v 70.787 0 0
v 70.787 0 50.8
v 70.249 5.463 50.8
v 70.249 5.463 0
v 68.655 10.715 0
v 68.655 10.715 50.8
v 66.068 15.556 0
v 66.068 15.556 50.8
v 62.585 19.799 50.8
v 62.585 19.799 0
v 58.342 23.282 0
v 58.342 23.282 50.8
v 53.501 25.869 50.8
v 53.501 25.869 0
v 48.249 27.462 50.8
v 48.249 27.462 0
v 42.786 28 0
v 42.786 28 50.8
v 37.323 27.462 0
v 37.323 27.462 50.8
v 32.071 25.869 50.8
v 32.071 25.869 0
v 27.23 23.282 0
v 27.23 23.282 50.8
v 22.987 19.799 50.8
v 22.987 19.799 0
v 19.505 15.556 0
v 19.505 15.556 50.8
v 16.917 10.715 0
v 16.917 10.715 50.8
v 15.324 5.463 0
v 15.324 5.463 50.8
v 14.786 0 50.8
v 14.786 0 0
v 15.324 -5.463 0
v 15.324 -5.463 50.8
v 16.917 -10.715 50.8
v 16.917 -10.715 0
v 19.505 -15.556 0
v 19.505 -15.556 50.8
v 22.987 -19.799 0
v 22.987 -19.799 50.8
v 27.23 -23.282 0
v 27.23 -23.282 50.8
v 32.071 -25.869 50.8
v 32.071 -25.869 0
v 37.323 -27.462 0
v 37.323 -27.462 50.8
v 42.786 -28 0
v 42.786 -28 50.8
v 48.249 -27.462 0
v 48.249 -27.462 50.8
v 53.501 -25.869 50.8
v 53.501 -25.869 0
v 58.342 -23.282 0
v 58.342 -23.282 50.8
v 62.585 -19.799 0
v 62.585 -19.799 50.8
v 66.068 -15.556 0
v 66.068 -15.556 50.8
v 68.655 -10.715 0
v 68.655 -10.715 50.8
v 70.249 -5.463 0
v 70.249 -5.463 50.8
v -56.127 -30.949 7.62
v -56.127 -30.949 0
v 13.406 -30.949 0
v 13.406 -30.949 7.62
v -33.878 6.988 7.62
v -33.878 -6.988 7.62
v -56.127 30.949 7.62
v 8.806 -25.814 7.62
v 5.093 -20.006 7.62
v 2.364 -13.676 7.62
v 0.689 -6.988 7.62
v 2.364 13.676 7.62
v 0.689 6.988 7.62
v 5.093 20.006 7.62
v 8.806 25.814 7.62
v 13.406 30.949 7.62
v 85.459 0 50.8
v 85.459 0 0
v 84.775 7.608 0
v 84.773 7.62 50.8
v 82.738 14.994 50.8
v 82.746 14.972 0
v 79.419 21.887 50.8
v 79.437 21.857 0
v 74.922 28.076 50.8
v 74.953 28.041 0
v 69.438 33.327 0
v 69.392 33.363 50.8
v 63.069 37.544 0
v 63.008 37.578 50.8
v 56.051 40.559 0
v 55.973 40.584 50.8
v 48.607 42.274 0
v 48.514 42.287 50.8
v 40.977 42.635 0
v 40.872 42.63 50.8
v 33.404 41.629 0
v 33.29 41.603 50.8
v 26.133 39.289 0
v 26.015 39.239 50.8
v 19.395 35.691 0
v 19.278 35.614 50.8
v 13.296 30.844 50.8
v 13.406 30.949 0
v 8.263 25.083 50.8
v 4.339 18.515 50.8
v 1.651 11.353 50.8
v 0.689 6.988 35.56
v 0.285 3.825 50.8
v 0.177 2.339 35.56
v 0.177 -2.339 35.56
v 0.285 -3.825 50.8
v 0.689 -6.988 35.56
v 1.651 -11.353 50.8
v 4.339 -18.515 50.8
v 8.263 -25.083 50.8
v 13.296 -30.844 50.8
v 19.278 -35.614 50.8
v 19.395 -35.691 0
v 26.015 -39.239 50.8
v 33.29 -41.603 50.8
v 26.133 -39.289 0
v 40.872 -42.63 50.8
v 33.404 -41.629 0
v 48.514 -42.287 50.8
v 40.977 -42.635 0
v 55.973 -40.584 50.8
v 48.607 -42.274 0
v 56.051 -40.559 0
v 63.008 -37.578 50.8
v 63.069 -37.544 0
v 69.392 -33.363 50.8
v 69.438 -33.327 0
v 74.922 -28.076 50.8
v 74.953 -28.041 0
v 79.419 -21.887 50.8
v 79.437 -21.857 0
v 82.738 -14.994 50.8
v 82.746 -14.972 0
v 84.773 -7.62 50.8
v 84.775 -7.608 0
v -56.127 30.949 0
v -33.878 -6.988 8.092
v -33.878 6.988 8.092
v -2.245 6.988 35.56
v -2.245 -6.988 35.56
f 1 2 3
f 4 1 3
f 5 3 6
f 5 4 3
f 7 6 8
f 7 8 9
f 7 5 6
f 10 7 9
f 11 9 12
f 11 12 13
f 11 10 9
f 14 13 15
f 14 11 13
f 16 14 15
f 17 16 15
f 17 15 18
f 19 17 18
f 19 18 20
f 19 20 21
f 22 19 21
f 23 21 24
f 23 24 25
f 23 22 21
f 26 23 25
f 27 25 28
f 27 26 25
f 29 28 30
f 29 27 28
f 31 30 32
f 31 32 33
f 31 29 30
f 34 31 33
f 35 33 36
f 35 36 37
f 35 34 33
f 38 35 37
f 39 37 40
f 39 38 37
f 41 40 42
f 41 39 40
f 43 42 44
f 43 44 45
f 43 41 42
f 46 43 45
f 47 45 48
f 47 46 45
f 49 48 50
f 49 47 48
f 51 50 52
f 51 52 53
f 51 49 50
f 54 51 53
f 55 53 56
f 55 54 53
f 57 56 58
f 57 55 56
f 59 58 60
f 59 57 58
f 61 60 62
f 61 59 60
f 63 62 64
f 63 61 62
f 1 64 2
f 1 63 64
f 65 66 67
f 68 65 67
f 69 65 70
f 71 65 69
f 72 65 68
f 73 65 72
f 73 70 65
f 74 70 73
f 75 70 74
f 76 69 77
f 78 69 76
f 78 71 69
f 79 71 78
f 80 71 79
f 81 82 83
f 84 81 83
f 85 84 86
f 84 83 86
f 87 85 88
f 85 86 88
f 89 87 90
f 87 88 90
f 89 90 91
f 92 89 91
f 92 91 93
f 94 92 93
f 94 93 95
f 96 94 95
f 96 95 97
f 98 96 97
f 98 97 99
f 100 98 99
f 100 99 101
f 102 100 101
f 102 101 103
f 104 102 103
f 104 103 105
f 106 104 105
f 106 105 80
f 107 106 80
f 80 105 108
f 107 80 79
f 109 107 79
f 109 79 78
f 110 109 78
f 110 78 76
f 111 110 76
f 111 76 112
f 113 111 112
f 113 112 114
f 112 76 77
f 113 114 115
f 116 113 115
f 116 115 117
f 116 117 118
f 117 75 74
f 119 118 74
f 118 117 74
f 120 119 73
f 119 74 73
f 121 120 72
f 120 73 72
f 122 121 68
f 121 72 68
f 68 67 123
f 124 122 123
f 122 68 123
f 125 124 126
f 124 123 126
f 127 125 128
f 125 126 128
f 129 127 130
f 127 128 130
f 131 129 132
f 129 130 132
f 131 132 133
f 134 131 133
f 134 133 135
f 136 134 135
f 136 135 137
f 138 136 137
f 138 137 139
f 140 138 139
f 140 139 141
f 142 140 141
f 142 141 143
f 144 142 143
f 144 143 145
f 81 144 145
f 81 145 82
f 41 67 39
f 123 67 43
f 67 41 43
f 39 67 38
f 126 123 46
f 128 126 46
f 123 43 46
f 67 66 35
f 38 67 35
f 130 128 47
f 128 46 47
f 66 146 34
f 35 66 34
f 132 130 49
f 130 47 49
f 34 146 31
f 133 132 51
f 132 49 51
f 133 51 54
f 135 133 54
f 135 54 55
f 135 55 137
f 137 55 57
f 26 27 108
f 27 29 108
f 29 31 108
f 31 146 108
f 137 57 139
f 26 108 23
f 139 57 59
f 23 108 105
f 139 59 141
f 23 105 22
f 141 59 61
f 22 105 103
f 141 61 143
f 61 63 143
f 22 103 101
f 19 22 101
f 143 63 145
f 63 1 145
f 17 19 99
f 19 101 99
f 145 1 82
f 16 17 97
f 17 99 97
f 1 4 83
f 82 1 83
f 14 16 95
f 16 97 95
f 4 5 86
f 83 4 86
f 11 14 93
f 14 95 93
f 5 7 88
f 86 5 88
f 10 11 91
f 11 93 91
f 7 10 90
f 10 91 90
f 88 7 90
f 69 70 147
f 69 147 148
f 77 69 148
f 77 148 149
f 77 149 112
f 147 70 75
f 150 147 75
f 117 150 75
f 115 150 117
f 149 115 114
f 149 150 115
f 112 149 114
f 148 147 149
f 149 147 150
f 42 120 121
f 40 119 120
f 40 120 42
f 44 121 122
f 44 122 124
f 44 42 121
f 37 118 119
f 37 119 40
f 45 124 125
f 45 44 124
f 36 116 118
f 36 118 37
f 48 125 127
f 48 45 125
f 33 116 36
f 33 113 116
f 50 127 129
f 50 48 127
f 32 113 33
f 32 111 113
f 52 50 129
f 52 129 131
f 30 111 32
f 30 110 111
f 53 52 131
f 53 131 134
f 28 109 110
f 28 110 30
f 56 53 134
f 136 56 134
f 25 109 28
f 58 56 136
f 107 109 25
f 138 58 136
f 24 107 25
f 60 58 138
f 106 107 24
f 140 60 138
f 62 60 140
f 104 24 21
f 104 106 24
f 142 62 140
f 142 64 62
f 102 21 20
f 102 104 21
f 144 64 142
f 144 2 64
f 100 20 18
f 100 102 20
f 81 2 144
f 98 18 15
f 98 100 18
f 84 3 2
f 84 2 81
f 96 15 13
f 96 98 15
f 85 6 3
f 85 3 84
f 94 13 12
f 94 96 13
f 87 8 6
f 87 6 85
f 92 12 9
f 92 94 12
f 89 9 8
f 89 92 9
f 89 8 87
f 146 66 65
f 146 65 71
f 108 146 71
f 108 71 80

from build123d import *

# Parameters (mm, degrees)
F0_R          = 42.6730408219
F0_R_2        = 28.0004794719
F1_DEPTH      = 50.8
F2_W          = 70.7396827638
F2_H          = 61.8972182274
F3_DEPTH      = 7.62
F4_W          = 47.3499465734
F4_H          = 13.9767918736
F5_DEPTH      = 27.94
F7_DEPTH      = 25.4
F7_DEPTH_BACK = 25.4


with BuildPart() as f1:
    # F0 (on Top) → F1 (new body)
    with BuildSketch(Plane.XY):
        with Locations((42.7860990167, 0)):
            Circle(F0_R)
        with Locations((42.7860990167, 0)):
            Circle(F0_R_2, mode=Mode.SUBTRACT)
    extrude(amount=F1_DEPTH)

    # F2 (on Top) → F3 (join)
    with BuildSketch(Plane.XY):
        with Locations((-20.7568462938, 0)):
            Rectangle(F2_W, F2_H)
    extrude(amount=F3_DEPTH)

    # F4 (on face) → F5 (join)
    with BuildSketch(Plane.XY.offset(7.62)):
        with Locations((-10.2029433474, 0)):
            Rectangle(F4_W, F4_H)
    extrude(amount=F5_DEPTH)

    # F6 (on Front) → F7 (cut, two sides)
    with BuildSketch(Plane.XZ) as f7_sk:
        Polygon((-34.1631546617, 37.5091433525), (-34.1631546617, 7.8441174701), (0, 37.5091433525), align=None)
    extrude(amount=-F7_DEPTH, mode=Mode.SUBTRACT)
    extrude(f7_sk.sketch, amount=F7_DEPTH_BACK, mode=Mode.SUBTRACT)


solid = f1.part
